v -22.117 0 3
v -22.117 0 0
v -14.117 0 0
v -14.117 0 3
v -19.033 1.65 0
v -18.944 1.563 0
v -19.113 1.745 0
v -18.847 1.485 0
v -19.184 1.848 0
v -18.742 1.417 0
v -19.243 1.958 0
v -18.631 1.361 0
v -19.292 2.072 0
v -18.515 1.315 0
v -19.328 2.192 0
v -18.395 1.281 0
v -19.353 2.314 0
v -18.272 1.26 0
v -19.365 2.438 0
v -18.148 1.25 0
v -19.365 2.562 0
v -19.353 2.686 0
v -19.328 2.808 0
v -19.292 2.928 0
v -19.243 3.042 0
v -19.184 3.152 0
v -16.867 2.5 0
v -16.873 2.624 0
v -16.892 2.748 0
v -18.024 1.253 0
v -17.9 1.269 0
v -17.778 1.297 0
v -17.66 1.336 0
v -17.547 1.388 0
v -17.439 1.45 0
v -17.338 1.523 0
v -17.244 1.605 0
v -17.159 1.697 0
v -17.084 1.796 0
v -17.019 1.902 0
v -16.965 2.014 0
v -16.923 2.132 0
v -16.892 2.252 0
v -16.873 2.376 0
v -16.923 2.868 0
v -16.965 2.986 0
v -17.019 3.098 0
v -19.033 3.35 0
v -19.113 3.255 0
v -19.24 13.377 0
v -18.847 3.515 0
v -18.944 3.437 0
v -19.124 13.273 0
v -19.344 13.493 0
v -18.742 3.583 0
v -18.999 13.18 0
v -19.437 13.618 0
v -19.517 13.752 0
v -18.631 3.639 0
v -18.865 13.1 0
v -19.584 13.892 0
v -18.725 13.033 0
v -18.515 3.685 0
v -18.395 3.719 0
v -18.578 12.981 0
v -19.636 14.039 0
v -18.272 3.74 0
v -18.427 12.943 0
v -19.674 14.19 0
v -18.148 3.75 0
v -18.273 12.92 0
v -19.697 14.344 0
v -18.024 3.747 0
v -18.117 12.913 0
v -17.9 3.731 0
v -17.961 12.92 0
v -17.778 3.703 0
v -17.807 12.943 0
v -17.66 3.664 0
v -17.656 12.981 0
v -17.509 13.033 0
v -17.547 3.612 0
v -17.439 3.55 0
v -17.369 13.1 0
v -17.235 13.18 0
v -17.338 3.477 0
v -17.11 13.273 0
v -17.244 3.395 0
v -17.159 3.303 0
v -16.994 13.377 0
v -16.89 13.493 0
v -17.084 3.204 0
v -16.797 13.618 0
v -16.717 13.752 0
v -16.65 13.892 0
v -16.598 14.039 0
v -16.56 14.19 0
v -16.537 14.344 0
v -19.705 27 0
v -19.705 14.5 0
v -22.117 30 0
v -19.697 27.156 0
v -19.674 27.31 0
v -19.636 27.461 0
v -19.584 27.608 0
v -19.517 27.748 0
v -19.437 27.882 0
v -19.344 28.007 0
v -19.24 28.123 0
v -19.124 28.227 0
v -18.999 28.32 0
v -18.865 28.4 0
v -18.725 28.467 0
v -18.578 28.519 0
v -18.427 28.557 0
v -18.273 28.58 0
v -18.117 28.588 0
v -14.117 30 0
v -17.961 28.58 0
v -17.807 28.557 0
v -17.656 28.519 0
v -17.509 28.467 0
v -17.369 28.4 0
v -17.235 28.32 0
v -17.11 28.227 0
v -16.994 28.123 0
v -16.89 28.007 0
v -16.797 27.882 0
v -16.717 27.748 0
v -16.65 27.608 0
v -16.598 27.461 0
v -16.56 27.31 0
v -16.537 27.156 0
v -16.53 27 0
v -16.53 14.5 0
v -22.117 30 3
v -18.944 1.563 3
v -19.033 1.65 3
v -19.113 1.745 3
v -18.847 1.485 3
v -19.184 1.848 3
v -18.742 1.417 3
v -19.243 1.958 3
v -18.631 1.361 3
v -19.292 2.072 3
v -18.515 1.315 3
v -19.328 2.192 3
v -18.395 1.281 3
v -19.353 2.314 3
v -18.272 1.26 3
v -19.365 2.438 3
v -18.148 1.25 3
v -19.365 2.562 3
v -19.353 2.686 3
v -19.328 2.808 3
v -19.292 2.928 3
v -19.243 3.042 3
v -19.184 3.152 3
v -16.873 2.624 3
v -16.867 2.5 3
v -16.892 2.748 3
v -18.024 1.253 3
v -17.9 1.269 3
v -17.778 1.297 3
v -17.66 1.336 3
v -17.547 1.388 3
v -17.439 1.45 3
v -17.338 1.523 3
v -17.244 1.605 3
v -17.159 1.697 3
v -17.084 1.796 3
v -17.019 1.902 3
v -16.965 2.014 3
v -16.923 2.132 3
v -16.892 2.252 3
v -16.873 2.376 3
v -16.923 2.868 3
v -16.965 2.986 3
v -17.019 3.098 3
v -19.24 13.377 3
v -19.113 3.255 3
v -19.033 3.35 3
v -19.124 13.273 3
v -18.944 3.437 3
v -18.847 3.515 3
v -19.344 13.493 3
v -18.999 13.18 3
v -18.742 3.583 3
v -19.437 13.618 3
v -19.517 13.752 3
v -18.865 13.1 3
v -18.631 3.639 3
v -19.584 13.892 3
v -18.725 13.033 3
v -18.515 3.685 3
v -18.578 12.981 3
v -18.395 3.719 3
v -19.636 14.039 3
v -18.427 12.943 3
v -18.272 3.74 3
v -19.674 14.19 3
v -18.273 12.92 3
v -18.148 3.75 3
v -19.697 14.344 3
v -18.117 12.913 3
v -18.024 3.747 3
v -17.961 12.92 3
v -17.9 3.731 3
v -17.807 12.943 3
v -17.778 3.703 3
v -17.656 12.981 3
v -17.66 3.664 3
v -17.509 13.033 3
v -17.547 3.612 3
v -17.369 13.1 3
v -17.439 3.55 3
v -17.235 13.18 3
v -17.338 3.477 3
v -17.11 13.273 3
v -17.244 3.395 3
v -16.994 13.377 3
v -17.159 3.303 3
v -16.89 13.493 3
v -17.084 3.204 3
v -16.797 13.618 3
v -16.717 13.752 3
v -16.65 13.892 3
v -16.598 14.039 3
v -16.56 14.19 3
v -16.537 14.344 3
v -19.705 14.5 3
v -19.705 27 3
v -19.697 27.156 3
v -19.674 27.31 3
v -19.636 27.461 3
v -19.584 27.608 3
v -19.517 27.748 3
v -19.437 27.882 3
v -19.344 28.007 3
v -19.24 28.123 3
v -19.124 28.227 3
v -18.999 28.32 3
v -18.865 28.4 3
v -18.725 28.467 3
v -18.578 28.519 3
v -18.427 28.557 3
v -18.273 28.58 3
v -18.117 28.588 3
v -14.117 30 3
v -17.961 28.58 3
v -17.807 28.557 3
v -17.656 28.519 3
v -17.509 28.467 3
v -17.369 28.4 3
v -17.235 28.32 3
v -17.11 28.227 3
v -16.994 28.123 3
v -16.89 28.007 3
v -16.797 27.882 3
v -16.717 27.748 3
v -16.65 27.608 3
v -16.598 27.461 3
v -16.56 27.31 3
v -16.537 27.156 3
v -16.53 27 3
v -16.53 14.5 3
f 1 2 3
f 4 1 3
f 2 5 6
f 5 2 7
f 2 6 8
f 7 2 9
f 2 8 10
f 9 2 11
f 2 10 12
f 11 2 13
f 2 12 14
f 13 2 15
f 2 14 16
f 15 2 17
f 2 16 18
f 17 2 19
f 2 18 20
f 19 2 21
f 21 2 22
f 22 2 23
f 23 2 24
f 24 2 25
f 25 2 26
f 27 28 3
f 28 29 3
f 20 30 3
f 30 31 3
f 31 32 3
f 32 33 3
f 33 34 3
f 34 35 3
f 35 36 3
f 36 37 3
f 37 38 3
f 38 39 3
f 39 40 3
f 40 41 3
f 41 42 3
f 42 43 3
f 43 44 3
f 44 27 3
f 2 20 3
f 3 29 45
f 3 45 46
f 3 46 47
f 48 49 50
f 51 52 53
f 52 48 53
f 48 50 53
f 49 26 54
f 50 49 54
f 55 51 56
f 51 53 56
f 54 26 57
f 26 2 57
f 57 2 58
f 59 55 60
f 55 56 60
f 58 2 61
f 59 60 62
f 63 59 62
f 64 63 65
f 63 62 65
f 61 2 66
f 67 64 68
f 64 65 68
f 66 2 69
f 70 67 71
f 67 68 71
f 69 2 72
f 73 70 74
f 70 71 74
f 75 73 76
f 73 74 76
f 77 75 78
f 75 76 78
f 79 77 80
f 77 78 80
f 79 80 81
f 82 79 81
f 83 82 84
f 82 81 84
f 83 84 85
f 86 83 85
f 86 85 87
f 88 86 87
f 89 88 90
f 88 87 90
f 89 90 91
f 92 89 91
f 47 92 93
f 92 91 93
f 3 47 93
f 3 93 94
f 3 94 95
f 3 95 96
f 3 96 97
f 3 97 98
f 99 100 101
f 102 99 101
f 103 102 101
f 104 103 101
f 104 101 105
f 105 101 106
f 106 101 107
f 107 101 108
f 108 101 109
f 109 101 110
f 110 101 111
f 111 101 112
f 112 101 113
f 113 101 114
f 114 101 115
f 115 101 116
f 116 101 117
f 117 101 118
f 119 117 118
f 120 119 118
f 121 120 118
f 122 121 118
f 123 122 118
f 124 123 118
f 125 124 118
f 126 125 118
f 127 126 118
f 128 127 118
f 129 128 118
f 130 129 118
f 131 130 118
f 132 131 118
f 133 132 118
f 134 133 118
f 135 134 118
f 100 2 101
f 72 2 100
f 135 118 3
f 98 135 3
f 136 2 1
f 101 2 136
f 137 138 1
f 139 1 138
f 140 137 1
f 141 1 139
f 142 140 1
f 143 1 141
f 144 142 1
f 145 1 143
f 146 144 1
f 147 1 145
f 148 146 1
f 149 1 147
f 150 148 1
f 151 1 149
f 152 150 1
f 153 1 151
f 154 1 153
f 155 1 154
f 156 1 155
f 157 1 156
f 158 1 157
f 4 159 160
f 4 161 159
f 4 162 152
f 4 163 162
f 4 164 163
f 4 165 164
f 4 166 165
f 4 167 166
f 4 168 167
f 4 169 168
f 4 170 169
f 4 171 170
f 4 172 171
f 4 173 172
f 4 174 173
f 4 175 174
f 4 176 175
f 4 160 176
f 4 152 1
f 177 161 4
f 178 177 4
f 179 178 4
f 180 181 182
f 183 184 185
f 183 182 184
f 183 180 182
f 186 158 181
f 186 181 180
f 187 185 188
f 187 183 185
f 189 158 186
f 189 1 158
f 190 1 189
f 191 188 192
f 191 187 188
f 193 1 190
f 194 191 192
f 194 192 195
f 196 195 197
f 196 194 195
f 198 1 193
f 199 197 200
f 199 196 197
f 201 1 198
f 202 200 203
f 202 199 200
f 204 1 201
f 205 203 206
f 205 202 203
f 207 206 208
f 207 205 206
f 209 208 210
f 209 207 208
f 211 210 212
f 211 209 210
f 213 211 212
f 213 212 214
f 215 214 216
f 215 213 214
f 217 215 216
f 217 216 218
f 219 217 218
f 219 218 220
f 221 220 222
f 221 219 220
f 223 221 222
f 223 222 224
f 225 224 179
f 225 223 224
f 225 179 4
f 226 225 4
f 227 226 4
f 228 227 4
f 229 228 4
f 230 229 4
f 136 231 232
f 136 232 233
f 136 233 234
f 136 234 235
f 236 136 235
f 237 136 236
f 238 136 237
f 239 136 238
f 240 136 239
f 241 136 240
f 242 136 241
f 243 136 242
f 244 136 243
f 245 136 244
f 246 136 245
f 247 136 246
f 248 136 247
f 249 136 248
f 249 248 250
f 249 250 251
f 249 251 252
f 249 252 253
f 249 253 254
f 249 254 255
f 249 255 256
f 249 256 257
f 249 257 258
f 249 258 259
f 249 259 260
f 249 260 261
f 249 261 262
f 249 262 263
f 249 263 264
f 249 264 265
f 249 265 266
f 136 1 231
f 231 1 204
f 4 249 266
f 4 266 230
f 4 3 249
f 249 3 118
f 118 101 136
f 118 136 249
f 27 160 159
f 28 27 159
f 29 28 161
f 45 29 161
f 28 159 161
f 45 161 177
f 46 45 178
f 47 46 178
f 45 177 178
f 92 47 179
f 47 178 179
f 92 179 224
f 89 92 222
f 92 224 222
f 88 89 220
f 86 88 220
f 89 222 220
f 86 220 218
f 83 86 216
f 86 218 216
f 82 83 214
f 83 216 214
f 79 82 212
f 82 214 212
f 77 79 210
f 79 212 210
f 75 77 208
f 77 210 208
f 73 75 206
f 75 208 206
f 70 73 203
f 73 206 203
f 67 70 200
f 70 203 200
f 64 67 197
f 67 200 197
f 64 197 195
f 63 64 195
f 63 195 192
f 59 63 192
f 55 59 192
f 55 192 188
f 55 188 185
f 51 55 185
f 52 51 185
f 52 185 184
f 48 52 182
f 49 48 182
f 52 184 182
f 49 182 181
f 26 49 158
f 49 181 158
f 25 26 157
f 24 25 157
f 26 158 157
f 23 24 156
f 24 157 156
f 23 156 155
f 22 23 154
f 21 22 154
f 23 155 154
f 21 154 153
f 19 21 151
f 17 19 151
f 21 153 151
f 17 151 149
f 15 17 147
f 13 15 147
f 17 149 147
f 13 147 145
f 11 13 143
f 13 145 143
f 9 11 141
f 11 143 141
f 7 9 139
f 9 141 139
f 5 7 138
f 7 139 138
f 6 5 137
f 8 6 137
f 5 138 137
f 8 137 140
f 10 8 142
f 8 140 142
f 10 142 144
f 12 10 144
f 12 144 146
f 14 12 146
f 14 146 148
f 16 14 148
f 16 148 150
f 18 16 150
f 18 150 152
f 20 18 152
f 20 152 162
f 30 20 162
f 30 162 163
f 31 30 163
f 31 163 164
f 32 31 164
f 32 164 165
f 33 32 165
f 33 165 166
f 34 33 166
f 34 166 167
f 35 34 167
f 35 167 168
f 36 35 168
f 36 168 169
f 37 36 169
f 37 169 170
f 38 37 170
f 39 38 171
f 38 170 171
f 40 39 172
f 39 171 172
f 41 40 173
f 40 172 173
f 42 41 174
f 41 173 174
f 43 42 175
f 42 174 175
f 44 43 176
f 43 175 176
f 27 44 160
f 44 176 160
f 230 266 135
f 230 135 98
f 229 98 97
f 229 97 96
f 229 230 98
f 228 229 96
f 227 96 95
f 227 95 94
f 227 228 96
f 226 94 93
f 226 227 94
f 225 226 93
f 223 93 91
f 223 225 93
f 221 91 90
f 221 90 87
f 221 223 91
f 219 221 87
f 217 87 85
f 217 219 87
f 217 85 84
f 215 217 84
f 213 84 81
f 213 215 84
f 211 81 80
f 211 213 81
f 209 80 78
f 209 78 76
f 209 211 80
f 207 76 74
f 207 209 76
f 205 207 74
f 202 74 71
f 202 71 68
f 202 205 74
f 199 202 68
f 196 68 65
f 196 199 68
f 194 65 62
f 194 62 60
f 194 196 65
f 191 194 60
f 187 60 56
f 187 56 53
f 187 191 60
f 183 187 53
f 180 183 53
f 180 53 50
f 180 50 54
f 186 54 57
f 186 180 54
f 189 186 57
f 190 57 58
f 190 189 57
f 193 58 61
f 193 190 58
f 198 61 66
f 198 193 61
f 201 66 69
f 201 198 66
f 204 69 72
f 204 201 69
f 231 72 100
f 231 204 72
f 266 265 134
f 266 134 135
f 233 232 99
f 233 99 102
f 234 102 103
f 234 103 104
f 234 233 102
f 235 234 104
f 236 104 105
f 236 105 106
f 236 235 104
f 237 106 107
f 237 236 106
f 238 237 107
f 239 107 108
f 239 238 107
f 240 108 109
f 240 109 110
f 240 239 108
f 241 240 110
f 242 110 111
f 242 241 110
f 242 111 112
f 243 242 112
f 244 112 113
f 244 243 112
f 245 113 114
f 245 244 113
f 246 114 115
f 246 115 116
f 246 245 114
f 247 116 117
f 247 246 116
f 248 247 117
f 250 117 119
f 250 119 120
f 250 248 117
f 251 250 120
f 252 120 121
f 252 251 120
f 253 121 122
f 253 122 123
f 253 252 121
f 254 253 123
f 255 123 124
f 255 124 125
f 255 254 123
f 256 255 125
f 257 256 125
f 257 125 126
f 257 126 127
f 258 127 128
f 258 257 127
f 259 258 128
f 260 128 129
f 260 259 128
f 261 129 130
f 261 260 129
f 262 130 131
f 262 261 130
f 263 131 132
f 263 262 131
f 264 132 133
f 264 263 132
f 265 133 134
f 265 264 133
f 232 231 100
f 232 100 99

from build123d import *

# Parameters (mm, degrees)
SKETCH1_W           = 8
SKETCH1_H           = 30
BOSS_EXTRUDE1_DEPTH = 3
SKETCH2_R           = 1.25
CUT_EXTRUDE1_DEPTH  = 3


with BuildPart() as part:
    # Sketch1 → Boss-Extrude1 (new body)
    with BuildSketch(Plane.XY):
        with Locations((-18.117004067, 15)):
            Rectangle(SKETCH1_W, SKETCH1_H)
    extrude(amount=BOSS_EXTRUDE1_DEPTH)

    # Sketch2 → Cut-Extrude1 (cut)
    with BuildSketch(Plane.XY.offset(3)):
        with Locations((-18.117004067, 2.5)):
            Circle(SKETCH2_R)
        with BuildLine():
            Line((-16.529504067, 27), (-16.529504067, 14.5))
            ThreePointArc((-16.529504067, 14.5), (-18.117004067, 12.9125), (-19.704504067, 14.5))
            Line((-19.704504067, 14.5), (-19.704504067, 27))
            ThreePointArc((-19.704504067, 27), (-18.117004067, 28.5875), (-16.529504067, 27))
        make_face()
    extrude(amount=-CUT_EXTRUDE1_DEPTH, mode=Mode.SUBTRACT)


solid = part.part
